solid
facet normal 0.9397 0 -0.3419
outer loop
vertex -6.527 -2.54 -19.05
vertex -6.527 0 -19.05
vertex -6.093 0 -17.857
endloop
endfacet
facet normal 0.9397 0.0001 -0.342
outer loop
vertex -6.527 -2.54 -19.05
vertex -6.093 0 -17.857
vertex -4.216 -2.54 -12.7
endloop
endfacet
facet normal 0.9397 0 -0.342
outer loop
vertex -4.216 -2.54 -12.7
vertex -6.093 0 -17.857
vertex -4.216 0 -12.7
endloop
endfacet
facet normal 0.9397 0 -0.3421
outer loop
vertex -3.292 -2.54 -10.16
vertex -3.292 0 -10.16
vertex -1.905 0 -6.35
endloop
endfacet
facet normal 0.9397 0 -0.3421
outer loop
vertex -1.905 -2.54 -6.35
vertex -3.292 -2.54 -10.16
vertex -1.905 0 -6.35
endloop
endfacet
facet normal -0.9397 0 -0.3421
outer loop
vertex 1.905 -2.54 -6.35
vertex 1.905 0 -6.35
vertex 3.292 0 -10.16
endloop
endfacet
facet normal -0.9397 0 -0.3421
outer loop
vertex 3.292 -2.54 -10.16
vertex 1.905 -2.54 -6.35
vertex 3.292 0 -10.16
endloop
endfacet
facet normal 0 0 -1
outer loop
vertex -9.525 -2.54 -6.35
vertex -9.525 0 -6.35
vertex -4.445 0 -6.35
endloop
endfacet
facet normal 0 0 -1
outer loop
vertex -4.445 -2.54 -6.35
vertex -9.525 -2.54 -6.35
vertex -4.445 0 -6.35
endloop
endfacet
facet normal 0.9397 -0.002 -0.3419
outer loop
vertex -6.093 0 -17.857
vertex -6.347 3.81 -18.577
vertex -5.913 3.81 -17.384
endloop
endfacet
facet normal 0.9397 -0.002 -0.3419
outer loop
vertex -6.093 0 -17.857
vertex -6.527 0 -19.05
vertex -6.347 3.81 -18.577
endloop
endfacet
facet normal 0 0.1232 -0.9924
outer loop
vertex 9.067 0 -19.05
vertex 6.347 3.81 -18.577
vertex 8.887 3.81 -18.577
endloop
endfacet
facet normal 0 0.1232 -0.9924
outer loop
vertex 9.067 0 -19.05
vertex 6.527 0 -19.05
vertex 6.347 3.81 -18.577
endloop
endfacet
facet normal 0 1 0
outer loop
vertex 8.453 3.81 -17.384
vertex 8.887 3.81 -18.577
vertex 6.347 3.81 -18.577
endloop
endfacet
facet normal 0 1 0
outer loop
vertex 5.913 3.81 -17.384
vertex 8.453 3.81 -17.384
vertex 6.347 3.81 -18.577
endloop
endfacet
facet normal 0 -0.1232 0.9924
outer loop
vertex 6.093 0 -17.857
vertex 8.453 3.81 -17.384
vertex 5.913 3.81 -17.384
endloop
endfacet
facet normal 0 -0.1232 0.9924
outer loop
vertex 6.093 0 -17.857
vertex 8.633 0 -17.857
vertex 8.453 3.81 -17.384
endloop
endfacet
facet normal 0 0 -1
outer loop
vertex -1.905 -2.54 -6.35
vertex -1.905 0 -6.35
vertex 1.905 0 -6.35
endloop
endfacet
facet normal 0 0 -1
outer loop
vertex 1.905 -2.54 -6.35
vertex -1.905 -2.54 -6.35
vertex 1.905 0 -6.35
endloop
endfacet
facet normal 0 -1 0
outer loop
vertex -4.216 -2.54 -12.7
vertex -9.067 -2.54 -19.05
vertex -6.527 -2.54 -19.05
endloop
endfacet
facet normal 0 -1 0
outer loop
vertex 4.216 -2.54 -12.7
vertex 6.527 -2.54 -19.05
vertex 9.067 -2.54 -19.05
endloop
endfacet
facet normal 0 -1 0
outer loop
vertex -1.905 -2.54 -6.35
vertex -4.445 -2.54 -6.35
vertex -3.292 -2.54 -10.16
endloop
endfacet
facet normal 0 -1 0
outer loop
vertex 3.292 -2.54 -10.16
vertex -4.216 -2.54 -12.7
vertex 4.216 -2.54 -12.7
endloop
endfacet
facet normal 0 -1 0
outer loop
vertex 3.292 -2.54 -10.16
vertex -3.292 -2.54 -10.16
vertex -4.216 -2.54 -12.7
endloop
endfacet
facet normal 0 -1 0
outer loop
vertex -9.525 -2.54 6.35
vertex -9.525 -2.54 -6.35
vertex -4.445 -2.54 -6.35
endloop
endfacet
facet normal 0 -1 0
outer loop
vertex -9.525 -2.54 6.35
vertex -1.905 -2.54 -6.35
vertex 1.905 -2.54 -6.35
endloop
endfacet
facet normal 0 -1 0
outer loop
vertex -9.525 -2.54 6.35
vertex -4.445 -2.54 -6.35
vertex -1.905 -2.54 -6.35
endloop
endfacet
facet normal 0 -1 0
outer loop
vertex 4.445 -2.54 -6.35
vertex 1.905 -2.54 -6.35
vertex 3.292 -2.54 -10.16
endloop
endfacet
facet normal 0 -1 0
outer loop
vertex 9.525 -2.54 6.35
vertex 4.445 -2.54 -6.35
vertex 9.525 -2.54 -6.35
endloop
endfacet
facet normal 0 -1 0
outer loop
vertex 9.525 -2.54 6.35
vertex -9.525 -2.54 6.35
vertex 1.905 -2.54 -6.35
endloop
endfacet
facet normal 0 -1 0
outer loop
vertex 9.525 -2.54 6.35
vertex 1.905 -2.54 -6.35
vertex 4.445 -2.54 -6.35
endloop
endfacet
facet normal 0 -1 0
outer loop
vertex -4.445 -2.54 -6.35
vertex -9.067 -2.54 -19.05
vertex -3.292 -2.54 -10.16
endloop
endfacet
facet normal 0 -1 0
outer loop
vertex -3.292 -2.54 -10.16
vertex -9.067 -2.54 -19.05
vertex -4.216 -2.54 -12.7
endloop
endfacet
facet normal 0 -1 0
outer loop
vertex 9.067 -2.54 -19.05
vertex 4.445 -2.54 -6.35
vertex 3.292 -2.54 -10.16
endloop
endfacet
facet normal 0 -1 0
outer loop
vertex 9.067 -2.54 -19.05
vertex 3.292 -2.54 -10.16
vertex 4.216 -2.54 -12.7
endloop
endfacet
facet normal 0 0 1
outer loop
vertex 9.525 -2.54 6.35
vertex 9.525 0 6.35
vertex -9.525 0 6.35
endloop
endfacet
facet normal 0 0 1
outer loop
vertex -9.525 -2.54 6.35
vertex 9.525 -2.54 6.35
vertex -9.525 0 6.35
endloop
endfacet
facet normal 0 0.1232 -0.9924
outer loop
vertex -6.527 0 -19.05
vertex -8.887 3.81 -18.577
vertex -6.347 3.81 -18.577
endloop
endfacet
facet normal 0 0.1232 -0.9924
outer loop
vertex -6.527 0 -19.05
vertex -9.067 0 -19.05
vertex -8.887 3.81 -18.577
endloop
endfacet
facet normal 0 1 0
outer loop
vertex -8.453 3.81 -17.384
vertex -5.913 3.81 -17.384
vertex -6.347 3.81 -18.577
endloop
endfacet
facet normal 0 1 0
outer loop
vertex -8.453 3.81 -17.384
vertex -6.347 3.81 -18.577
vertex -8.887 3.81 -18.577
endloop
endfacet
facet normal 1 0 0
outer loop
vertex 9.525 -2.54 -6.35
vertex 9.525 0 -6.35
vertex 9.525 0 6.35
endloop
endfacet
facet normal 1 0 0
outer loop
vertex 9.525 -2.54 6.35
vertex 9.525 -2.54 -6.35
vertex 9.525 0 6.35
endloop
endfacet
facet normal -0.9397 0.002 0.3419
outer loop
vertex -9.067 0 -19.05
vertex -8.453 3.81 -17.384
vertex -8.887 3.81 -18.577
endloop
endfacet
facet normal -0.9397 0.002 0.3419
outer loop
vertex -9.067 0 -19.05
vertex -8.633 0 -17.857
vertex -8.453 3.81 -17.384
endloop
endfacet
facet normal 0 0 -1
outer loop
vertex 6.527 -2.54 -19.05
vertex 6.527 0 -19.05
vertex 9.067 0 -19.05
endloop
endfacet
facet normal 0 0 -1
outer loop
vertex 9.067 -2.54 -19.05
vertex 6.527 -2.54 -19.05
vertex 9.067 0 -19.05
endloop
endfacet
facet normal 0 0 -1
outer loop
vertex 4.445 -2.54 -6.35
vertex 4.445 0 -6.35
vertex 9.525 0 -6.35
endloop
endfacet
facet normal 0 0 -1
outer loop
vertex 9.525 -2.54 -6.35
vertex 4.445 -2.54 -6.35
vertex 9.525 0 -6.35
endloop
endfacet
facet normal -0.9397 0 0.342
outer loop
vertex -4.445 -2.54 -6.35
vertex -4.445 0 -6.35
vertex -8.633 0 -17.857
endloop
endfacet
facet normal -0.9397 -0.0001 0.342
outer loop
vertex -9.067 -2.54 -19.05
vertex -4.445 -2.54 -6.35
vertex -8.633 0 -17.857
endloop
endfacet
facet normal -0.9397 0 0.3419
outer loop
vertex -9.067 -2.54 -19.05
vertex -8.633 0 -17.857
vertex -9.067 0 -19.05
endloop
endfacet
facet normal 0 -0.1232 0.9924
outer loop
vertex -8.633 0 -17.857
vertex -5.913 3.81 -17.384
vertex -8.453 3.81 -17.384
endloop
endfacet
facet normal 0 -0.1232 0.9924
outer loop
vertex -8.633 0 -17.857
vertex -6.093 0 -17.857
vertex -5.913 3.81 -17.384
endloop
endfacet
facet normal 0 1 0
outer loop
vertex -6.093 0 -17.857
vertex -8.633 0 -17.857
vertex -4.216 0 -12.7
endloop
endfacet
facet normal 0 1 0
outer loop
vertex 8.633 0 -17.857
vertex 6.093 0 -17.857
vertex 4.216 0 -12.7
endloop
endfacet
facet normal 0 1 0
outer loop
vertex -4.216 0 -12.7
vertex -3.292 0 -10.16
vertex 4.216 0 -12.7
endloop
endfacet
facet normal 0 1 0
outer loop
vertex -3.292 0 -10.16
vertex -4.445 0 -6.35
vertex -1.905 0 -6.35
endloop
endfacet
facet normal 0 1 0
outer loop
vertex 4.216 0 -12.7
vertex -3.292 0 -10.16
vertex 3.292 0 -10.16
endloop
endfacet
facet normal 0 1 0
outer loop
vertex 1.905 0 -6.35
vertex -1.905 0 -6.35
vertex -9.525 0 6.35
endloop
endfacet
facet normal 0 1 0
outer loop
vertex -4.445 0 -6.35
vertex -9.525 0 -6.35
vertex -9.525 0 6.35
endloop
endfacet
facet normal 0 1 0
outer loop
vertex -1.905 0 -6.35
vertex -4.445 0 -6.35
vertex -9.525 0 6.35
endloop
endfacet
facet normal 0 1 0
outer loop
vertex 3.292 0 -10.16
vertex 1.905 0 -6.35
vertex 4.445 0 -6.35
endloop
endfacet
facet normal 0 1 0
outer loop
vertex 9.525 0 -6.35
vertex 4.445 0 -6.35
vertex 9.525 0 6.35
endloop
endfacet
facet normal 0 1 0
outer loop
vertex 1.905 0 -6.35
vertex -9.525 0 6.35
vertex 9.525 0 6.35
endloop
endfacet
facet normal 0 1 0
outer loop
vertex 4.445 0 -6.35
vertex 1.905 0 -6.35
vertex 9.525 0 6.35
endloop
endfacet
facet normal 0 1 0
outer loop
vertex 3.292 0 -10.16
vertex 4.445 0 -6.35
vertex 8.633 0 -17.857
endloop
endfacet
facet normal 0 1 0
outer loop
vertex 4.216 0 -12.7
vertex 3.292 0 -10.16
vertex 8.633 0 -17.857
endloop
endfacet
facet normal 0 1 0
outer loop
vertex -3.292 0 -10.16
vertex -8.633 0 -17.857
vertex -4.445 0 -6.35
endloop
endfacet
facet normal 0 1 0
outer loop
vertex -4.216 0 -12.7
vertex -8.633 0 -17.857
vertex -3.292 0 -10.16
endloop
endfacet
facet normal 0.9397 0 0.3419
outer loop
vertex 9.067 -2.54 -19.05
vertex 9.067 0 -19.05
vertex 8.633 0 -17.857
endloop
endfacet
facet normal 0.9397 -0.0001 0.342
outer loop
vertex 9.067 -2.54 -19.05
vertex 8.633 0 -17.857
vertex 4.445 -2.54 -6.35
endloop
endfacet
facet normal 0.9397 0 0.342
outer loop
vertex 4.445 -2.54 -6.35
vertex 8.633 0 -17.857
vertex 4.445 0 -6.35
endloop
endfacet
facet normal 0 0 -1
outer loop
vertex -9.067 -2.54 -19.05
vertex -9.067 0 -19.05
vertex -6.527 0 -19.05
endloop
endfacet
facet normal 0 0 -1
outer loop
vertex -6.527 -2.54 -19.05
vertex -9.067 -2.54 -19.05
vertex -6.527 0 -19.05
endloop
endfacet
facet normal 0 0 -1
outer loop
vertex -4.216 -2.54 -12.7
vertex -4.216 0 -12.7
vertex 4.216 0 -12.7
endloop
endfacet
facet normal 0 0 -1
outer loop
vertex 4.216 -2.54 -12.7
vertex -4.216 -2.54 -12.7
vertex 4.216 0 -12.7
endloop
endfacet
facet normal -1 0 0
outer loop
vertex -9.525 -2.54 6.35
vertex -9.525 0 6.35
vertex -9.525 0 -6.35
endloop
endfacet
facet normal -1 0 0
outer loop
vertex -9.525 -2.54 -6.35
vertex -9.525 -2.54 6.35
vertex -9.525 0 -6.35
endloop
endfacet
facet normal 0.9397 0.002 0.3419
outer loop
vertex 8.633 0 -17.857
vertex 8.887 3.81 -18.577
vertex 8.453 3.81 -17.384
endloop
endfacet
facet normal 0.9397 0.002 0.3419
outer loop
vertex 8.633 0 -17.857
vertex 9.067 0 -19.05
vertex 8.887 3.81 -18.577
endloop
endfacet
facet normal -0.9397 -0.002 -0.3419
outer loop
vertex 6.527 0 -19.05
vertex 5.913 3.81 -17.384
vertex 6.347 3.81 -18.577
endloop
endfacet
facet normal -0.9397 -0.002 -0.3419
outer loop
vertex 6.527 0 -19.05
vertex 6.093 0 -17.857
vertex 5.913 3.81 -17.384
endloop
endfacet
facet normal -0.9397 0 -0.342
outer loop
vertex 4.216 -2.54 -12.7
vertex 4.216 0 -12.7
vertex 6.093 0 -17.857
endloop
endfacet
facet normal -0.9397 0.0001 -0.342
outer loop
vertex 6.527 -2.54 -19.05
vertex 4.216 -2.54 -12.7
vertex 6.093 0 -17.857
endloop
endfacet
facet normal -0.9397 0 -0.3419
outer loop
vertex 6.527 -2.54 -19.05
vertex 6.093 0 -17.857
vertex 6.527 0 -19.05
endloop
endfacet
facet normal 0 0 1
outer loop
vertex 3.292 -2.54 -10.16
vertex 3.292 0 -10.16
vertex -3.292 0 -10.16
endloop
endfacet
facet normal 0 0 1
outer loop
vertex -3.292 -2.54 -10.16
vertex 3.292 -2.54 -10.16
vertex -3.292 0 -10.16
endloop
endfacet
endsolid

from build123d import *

# Parameters (mm, degrees)
F1_DEPTH = 2.54


with BuildPart() as f1:
    # F0 (on Front) → F1 (new body)
    with BuildSketch(Plane.XZ):
        Polygon((-9.525, 6.35), (-9.525, -6.35), (-4.445, -6.35), (-9.067422, -19.05), (-6.527422, -19.05), (-4.216211, -12.7), (4.216211, -12.7), (6.527422, -19.05), (9.067422, -19.05), (4.445, -6.35), (9.525, -6.35), (9.525, 6.35), align=None)
        Polygon((-1.905, -6.35), (1.905, -6.35), (3.291727, -10.16), (-3.291727, -10.16), align=None, mode=Mode.SUBTRACT)
    extrude(amount=F1_DEPTH)

    # F4 (on offset) → F5 section 0
    with BuildSketch(Plane.XZ.offset(-3.81)):
        Polygon((-5.912923, -17.383784), (-8.452923, -17.383784), (-8.887289, -18.577194), (-6.347289, -18.577194), align=None)
    # F2 (on face) → F5 section 1
    with BuildSketch(Plane(origin=(0, 0, 0), x_dir=(-1, 0, 0), z_dir=(0, 1, 0))):
        Polygon((8.633056, -17.85659), (6.093056, -17.85659), (6.527422, -19.05), (9.067422, -19.05), align=None)
    loft()

    # F4 (on offset) → F6 section 0
    with BuildSketch(Plane.XZ.offset(-3.81)):
        Polygon((8.887289, -18.577194), (8.452923, -17.383784), (5.912923, -17.383784), (6.347289, -18.577194), align=None)
    # F2 (on face) → F6 section 1
    with BuildSketch(Plane(origin=(0, 0, 0), x_dir=(-1, 0, 0), z_dir=(0, 1, 0))):
        Polygon((-8.633056, -17.85659), (-9.067422, -19.05), (-6.527422, -19.05), (-6.093056, -17.85659), align=None)
    loft()


solid = f1.part
